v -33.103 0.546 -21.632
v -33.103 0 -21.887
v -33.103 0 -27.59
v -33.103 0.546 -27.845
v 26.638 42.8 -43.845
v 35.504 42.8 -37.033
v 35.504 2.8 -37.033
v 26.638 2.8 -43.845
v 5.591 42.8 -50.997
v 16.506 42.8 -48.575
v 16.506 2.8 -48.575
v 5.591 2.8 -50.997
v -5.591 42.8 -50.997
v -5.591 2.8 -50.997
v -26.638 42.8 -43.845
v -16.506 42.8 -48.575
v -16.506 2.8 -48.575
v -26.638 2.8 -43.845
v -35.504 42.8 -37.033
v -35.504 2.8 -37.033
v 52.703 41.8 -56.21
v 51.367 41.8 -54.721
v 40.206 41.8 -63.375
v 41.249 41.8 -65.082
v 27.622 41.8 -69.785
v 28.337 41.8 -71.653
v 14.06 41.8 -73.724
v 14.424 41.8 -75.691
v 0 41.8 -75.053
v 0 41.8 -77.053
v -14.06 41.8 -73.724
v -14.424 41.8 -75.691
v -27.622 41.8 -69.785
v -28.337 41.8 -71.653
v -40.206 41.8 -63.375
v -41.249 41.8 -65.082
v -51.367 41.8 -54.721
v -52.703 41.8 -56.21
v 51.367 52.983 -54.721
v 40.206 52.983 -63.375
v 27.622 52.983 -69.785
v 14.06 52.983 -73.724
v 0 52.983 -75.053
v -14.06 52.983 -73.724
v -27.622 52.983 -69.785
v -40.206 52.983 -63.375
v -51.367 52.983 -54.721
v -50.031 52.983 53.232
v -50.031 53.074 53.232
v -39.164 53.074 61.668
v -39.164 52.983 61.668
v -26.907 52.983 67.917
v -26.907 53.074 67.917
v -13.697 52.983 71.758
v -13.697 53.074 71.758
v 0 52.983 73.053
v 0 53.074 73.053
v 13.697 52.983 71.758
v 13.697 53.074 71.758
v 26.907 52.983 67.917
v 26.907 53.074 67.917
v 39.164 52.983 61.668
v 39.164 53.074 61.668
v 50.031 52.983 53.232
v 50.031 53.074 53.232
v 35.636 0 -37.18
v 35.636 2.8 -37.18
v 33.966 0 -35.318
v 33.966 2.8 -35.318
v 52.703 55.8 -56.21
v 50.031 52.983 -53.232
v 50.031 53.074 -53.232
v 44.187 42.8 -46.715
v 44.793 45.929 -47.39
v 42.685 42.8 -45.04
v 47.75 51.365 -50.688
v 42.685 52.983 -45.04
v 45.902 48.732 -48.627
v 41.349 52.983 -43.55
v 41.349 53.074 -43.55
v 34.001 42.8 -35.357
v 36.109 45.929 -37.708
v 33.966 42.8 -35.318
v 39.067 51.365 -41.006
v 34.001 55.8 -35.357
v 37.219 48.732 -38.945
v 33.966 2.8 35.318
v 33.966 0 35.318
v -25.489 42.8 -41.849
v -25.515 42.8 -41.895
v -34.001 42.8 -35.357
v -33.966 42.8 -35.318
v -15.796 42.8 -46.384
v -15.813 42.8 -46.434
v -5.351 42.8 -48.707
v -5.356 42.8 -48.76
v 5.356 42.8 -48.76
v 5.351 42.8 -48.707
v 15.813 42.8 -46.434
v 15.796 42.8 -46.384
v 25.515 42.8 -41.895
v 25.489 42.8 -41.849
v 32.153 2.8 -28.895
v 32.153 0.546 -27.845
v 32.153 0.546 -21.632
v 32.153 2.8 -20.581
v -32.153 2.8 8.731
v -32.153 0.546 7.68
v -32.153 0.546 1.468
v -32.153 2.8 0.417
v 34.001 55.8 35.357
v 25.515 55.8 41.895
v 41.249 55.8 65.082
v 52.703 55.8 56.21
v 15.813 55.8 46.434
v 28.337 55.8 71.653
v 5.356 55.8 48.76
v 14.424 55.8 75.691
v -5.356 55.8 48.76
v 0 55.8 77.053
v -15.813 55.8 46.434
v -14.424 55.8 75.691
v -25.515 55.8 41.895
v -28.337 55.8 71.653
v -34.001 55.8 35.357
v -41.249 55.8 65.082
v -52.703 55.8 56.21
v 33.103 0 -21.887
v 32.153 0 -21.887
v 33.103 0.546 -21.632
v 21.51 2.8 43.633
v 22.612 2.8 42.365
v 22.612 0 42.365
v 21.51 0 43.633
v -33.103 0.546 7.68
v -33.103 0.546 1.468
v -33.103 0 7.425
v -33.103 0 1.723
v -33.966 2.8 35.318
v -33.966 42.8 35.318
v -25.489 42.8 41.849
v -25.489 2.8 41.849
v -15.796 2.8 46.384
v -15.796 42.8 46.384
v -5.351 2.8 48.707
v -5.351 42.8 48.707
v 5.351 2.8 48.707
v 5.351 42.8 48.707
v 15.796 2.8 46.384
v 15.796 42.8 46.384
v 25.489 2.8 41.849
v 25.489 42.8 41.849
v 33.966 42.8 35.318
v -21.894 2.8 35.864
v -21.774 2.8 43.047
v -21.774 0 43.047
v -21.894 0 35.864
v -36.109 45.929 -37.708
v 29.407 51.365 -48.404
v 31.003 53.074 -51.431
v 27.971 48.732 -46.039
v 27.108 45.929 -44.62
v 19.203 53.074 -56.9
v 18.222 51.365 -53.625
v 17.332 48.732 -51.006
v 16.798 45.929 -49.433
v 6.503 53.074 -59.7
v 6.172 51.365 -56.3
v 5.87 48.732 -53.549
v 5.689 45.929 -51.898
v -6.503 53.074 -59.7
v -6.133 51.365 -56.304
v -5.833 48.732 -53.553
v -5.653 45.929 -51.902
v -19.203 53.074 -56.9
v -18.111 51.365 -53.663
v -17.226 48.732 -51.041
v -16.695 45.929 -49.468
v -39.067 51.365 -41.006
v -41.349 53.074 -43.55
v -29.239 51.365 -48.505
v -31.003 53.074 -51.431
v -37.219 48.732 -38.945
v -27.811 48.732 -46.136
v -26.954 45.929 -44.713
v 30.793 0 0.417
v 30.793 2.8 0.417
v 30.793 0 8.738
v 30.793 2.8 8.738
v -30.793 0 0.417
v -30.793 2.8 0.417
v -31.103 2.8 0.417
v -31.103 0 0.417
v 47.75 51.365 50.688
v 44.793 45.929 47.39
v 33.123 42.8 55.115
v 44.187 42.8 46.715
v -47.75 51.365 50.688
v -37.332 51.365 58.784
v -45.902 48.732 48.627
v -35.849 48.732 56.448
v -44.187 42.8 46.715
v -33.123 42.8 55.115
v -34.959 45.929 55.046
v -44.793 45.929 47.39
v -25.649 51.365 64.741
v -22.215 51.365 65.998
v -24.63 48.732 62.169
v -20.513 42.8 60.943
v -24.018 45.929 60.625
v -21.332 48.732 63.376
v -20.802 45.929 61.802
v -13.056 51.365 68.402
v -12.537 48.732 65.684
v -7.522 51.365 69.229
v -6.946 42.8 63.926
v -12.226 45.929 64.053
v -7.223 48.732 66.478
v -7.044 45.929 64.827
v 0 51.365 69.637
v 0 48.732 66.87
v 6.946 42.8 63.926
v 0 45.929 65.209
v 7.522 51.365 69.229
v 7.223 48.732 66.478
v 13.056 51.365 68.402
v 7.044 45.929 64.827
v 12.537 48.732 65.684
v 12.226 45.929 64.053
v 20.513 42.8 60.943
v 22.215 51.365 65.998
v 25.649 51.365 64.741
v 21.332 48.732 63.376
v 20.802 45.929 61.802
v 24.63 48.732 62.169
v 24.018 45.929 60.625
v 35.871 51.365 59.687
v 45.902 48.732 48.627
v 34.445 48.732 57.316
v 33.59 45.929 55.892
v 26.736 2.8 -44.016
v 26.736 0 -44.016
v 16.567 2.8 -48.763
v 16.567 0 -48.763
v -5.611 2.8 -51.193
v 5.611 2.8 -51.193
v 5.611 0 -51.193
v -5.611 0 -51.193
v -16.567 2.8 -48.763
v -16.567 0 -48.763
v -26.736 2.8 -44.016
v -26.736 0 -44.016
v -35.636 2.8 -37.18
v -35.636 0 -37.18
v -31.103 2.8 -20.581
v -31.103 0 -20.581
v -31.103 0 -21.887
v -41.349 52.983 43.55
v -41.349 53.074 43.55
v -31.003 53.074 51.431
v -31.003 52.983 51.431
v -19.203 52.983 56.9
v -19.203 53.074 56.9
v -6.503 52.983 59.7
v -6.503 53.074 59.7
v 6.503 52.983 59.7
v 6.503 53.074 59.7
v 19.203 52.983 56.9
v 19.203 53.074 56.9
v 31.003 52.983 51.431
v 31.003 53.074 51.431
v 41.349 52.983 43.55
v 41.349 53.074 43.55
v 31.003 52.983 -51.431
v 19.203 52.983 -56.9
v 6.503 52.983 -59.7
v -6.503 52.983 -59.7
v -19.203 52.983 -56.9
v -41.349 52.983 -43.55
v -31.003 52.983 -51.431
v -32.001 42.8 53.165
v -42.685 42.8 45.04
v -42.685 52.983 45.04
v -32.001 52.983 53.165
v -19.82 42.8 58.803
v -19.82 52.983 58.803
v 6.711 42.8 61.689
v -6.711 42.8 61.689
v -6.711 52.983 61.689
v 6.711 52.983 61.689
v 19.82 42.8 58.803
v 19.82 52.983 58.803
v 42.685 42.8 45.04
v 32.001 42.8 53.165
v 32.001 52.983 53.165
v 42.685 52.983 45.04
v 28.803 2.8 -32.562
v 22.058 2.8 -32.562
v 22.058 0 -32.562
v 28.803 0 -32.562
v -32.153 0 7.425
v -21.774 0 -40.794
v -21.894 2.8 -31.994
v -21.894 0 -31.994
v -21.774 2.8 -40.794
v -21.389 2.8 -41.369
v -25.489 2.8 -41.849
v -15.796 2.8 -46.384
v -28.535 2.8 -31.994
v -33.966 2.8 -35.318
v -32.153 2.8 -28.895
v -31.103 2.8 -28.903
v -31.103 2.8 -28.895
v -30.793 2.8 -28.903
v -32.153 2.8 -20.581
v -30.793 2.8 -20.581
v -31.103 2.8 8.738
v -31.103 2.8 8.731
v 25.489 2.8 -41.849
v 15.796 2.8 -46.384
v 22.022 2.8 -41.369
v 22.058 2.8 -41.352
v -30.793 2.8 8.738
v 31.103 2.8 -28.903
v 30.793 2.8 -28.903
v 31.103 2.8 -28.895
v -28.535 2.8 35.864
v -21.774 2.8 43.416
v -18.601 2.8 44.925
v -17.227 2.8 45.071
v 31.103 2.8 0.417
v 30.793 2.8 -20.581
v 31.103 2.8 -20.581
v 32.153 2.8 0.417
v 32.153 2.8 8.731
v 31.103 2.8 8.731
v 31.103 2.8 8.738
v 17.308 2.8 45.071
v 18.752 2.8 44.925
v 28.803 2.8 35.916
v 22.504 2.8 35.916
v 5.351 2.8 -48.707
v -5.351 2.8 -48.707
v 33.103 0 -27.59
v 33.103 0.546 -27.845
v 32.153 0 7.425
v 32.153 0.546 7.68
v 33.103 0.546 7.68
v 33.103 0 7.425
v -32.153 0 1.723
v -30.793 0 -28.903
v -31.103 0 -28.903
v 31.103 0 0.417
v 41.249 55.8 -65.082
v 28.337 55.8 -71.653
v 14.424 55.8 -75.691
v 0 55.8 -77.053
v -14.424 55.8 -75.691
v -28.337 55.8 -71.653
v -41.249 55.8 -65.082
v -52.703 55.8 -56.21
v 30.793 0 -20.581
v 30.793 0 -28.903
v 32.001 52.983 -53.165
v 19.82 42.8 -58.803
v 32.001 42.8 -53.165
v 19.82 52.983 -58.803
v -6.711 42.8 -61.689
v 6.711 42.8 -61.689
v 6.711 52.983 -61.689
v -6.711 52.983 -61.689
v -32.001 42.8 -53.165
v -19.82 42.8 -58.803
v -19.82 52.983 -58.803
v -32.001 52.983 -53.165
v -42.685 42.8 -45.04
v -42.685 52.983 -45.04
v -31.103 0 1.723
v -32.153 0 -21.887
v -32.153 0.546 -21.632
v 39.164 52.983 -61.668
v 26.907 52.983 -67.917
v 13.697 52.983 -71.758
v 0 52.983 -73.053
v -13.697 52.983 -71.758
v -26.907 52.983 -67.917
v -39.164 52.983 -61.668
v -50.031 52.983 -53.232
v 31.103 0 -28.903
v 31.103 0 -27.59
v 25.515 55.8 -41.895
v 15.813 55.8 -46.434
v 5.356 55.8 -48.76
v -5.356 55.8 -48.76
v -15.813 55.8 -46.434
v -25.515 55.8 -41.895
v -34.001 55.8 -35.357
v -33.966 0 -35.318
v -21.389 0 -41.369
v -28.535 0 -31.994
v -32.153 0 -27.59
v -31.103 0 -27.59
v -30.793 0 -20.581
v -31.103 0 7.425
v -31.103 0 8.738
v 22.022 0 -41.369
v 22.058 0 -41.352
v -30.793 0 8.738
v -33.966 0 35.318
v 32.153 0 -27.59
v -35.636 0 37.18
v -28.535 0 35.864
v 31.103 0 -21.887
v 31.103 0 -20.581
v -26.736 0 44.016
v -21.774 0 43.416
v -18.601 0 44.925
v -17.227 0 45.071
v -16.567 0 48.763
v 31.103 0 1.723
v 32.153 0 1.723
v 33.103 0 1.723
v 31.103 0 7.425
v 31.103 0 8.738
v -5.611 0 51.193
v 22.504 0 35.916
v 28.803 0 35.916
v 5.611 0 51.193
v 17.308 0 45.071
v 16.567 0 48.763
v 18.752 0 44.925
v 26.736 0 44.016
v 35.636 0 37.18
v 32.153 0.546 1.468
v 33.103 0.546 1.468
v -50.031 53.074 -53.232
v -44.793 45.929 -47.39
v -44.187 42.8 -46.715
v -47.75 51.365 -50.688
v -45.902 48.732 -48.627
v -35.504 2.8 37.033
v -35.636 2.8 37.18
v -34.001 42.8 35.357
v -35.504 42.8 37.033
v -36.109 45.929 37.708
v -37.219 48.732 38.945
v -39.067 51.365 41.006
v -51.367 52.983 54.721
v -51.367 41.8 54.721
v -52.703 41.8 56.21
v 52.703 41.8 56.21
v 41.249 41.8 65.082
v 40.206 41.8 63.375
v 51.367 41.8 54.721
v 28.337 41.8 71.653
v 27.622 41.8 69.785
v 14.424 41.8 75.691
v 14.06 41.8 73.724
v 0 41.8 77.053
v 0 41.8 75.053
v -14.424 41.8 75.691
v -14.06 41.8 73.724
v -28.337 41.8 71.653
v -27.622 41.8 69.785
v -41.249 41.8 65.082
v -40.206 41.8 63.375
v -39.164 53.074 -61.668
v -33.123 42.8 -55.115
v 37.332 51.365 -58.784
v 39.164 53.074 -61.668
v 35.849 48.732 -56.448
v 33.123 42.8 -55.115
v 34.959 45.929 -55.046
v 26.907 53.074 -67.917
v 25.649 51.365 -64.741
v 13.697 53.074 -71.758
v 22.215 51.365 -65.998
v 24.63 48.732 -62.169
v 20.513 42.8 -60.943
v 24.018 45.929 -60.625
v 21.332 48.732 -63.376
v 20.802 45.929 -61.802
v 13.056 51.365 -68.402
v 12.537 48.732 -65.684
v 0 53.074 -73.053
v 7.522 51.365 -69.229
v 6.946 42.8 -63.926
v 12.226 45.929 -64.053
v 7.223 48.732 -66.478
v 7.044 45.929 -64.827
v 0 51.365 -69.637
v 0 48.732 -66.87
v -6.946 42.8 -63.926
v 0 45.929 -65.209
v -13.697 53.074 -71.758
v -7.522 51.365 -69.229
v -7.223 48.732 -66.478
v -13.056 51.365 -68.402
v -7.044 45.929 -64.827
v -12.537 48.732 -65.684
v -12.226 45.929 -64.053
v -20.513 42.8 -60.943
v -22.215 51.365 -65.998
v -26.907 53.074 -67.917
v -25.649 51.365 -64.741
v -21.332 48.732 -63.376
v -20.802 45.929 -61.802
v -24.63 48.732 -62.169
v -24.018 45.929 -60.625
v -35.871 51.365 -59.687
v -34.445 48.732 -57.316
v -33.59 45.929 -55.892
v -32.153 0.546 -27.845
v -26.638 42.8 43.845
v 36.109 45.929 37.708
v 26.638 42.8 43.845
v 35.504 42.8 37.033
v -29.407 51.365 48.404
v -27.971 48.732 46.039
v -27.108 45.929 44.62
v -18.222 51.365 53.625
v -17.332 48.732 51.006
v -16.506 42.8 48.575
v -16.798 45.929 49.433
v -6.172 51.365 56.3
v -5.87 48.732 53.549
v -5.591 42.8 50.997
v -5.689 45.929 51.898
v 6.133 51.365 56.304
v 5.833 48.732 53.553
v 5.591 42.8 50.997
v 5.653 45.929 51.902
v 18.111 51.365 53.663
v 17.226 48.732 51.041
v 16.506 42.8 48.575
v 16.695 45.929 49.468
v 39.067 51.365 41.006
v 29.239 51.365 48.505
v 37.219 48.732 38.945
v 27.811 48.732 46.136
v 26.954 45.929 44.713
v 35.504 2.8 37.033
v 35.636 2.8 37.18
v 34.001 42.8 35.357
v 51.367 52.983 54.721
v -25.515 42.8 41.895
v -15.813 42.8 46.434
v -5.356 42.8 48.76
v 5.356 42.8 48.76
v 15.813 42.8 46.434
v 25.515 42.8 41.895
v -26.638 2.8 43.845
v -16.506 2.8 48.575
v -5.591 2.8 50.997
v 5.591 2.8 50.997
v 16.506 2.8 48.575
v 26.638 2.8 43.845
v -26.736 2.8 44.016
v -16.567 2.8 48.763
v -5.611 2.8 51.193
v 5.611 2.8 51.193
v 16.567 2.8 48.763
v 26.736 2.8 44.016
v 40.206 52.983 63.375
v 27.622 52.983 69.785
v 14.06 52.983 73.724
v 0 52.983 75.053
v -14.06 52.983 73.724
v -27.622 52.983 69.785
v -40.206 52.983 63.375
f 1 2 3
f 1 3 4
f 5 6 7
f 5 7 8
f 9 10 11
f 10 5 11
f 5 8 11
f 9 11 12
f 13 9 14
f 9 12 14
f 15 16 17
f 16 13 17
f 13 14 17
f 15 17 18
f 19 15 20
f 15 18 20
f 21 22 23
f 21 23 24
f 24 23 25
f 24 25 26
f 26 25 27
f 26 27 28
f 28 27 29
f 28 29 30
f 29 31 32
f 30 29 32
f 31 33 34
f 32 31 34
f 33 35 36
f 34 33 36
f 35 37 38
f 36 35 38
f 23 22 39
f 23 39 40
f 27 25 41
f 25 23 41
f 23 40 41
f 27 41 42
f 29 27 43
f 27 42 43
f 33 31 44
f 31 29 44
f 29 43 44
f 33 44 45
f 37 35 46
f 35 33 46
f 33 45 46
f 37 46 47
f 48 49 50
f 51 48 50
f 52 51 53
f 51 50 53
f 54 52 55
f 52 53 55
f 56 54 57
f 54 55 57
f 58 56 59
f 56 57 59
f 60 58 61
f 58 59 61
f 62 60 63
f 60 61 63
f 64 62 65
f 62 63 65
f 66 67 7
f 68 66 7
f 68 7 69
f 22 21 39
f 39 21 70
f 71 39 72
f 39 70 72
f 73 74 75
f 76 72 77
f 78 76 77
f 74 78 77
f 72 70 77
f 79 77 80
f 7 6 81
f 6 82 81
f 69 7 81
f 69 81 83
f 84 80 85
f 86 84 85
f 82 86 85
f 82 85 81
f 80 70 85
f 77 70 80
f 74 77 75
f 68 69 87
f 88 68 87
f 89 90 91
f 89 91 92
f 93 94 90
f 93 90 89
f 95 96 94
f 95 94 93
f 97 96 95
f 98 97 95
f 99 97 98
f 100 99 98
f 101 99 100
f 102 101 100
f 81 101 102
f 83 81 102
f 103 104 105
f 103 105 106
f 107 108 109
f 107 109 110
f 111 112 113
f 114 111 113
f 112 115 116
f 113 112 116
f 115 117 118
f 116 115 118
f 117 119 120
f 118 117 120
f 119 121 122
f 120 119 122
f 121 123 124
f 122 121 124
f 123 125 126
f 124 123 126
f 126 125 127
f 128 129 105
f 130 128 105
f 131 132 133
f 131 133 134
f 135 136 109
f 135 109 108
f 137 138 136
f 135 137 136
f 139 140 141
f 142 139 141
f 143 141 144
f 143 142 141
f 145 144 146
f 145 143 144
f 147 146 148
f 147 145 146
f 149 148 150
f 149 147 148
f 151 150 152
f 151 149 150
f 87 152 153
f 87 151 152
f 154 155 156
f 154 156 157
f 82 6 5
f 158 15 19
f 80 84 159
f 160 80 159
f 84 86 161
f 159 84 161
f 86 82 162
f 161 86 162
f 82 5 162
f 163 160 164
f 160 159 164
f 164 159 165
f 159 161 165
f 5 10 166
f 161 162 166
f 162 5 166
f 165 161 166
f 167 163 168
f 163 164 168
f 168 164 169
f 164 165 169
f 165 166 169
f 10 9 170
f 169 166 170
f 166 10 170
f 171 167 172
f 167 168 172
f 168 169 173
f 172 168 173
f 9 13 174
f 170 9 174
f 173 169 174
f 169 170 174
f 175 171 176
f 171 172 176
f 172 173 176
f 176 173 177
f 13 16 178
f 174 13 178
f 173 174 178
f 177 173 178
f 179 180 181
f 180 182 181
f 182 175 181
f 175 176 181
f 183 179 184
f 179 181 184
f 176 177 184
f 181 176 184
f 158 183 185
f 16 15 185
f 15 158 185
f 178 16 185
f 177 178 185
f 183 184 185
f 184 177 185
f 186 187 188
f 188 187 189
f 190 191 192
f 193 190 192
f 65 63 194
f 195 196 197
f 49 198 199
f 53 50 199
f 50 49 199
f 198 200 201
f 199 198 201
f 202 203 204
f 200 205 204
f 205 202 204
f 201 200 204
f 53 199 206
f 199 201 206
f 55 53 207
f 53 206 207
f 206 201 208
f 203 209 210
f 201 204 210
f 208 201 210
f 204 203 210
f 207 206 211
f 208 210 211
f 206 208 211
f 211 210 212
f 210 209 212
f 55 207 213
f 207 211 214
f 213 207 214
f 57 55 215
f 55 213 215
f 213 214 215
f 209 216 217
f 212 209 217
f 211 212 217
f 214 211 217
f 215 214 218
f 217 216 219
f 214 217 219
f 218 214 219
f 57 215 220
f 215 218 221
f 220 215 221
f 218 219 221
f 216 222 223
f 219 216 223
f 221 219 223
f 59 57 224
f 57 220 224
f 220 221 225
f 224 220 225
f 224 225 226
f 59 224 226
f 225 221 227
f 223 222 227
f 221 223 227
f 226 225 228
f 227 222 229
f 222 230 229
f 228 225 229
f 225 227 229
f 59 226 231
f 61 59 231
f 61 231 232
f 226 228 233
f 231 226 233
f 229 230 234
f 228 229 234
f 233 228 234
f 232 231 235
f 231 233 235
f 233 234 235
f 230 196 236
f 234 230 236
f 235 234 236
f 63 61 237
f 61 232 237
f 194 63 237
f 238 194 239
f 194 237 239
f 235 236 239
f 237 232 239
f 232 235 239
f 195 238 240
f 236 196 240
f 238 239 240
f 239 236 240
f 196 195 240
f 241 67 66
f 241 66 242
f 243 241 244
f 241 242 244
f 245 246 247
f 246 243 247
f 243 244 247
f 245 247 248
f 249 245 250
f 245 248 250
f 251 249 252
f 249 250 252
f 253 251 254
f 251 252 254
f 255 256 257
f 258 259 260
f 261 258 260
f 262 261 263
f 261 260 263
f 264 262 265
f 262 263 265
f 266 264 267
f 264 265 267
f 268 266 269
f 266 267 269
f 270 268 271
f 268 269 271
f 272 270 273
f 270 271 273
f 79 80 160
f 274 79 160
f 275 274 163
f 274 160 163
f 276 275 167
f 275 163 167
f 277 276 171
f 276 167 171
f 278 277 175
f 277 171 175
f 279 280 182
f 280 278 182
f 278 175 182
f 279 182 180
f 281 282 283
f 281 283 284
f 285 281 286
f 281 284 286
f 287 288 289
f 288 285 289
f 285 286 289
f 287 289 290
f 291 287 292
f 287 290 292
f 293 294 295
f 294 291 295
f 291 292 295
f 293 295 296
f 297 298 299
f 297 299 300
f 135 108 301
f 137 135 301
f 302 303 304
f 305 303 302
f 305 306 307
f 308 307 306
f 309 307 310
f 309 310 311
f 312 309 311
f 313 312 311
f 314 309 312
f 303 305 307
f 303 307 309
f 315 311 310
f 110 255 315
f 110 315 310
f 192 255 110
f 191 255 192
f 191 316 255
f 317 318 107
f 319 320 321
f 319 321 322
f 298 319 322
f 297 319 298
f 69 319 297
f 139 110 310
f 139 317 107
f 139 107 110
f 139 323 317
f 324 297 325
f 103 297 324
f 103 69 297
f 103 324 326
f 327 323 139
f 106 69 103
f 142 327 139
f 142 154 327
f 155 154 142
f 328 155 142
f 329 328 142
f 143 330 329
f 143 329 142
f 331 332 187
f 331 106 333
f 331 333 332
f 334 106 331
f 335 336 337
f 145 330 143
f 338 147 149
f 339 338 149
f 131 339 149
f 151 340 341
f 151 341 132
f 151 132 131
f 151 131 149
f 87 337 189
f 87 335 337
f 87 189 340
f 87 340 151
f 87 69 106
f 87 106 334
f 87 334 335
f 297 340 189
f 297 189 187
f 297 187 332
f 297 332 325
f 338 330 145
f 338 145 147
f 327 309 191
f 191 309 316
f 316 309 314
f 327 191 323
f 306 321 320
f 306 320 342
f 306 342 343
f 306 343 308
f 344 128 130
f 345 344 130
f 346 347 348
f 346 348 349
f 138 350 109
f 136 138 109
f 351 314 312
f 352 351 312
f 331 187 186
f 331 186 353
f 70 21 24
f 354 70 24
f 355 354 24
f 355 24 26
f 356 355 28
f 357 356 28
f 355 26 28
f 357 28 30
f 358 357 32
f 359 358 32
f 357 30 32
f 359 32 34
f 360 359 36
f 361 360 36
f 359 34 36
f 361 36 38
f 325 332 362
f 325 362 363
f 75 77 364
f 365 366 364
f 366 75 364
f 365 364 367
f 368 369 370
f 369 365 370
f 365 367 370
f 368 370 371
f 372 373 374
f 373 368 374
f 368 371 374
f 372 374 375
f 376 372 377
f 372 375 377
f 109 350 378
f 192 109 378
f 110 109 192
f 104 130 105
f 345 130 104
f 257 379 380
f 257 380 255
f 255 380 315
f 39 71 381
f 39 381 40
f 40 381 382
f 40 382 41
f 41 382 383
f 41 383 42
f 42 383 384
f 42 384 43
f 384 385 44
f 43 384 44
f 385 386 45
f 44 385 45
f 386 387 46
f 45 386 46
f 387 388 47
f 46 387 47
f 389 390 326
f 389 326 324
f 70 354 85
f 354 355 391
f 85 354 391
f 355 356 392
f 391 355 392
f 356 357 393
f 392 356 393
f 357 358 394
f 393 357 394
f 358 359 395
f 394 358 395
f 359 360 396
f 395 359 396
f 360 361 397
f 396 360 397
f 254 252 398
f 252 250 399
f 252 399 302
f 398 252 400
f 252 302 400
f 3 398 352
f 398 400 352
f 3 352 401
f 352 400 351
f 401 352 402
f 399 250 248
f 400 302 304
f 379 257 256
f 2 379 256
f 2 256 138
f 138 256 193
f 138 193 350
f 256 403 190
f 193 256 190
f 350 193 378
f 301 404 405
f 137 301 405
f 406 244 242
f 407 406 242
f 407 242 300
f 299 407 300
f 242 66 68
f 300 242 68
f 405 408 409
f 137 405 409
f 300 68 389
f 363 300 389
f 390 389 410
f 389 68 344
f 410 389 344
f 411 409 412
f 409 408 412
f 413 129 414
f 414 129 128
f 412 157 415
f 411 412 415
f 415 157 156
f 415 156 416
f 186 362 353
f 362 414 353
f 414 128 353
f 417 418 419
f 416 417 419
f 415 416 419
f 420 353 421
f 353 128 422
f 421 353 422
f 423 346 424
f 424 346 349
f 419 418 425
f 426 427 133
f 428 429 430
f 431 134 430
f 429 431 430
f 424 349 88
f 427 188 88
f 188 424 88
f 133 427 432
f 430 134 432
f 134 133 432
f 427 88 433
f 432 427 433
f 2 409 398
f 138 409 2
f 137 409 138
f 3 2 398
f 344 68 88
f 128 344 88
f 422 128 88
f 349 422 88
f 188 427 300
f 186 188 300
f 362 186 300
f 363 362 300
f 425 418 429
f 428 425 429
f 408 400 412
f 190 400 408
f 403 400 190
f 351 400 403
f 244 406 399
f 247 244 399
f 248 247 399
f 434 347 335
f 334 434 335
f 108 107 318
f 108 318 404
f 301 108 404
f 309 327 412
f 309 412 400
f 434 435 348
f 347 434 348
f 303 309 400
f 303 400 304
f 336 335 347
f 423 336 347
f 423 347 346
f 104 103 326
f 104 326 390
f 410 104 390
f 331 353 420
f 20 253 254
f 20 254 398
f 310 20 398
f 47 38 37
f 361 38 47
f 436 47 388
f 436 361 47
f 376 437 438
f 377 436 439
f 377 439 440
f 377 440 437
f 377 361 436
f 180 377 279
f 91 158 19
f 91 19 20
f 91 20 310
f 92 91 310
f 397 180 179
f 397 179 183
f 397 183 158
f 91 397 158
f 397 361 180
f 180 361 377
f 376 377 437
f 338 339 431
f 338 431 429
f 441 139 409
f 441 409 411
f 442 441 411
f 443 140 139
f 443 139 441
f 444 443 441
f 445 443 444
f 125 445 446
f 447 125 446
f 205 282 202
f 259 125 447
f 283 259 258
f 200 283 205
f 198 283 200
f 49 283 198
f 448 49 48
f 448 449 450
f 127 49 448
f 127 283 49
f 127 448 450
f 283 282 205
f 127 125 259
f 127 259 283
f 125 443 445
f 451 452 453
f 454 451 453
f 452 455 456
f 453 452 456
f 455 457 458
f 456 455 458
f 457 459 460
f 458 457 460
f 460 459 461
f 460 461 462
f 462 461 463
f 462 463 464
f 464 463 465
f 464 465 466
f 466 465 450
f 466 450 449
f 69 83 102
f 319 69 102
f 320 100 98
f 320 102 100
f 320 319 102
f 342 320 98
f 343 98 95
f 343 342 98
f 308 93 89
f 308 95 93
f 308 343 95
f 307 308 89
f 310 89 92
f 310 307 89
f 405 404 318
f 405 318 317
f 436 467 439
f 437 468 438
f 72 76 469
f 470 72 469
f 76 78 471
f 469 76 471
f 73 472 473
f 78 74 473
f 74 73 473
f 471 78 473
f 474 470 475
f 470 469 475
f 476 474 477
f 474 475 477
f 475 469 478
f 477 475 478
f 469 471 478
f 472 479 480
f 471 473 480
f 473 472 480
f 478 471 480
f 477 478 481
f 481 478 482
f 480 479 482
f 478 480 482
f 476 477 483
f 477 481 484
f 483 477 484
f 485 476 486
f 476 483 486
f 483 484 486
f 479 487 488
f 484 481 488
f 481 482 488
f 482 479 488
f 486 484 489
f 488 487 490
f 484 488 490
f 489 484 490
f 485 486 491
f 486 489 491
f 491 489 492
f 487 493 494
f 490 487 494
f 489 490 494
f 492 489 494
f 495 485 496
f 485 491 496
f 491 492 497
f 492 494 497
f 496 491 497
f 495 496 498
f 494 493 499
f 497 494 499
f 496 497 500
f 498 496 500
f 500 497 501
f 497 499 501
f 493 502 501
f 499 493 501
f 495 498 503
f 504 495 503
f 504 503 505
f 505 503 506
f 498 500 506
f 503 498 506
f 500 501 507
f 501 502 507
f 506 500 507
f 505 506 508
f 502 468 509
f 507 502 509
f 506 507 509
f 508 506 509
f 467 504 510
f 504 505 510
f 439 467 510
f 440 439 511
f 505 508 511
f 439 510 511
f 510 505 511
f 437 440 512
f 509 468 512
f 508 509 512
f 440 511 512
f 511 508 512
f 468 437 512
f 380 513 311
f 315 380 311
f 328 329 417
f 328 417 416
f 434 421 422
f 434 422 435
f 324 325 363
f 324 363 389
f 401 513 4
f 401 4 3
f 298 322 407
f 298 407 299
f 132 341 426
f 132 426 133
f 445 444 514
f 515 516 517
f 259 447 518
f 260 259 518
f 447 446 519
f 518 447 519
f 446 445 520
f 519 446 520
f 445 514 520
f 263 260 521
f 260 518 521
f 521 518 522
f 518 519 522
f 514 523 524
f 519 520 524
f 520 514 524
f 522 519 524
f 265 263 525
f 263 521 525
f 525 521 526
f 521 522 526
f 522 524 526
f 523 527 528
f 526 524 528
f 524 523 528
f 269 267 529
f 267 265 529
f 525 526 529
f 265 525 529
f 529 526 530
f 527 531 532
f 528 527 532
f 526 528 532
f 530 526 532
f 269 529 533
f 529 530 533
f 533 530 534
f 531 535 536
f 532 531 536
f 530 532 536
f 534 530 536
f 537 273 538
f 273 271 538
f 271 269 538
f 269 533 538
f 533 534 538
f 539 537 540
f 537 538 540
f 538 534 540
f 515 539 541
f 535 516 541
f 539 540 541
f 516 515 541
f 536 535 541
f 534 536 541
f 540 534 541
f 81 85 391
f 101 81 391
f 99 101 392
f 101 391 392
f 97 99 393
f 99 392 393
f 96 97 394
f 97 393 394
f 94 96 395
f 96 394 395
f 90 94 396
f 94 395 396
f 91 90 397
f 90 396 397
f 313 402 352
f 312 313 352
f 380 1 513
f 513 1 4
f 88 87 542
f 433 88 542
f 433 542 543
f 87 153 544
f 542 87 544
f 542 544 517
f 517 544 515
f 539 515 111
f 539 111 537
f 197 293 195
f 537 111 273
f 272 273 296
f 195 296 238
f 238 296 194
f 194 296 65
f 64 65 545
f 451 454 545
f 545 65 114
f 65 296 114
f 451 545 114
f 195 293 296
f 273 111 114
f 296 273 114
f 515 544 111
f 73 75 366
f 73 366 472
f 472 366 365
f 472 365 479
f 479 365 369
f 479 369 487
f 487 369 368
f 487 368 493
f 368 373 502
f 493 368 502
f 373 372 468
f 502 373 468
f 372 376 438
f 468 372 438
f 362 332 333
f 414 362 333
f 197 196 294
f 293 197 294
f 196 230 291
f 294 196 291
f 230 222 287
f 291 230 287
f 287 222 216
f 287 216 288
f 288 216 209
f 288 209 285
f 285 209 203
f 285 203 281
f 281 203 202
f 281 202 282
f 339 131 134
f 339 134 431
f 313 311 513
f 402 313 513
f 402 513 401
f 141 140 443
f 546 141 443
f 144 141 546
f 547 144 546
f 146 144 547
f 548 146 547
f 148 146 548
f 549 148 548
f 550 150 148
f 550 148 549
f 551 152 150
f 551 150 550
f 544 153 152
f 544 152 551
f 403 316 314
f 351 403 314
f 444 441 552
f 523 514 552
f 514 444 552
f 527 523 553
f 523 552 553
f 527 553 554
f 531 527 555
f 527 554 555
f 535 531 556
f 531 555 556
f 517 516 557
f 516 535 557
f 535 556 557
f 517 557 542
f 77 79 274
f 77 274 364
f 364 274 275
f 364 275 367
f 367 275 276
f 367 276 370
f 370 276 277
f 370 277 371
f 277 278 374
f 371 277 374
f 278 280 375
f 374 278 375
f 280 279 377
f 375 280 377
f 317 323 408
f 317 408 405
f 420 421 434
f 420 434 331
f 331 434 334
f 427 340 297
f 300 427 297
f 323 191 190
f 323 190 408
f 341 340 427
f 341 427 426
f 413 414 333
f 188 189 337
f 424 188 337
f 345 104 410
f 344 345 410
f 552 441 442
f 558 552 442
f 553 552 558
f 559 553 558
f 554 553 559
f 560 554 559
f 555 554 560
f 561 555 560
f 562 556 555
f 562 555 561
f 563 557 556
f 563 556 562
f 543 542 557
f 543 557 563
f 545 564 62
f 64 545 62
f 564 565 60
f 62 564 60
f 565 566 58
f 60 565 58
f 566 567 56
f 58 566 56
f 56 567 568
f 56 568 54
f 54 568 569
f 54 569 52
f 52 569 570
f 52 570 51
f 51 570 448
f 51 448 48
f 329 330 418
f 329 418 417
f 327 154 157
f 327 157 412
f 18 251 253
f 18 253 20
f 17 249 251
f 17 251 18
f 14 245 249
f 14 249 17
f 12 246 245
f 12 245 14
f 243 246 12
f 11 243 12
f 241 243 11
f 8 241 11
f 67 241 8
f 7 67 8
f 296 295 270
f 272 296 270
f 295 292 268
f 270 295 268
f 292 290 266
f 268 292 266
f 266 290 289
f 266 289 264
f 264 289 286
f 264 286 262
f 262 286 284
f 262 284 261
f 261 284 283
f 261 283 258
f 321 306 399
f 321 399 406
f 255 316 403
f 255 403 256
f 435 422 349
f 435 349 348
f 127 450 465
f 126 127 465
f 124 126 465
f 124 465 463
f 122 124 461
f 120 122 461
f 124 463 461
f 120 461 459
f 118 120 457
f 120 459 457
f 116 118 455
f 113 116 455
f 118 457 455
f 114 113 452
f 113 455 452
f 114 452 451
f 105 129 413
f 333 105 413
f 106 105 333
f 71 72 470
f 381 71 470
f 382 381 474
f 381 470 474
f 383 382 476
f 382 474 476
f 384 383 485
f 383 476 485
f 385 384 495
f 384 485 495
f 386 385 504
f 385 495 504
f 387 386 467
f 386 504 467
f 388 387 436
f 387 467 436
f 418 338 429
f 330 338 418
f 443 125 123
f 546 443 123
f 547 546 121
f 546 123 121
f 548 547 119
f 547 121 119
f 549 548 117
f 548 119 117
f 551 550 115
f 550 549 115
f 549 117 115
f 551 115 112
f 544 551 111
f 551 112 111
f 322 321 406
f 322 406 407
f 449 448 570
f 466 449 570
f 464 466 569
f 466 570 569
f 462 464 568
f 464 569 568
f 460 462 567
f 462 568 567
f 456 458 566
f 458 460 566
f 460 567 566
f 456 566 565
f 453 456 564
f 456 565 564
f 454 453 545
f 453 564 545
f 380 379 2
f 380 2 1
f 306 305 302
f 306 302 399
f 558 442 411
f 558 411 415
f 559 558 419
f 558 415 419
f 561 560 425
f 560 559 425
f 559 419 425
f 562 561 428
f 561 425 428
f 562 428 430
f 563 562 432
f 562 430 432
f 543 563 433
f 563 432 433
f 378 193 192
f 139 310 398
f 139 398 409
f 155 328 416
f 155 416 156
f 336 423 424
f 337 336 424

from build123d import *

# Parameters (mm, degrees)
SKETCH1_R                = 51.5
BOSS_EXTRUDE1_DEPTH      = 2.8
SKETCH2_R                = 51.302702975
SKETCH2_R_2              = 49
BOSS_EXTRUDE2_DEPTH      = 40
CUT_EXTRUDE1_DEPTH       = 2.8
SNAP_START               = -32.152970268
SNAP_GROOVE2_DEPTH       = 1.05
SNAP_START_2             = -33.102970268
SNAP_GROOVE2_2_DEPTH     = 0.95
CUT_EXTRUDE9_DEPTH       = 123.425444719
MIRROR10_START           = -32.152970268
MIRROR10_COPY_1_DEPTH    = 1.05
MIRROR10_START_2         = -33.102970268
MIRROR10_COPY_2_DEPTH    = 0.95
MIRROR10_COPY_3_DEPTH    = 0.95
SKETCH23_W               = 0.31
SKETCH23_H               = 8.321250797
CUT_EXTRUDE18_DEPTH      = 10
MIRROR12_COPY_1_SKETCH_W = 0.31
MIRROR12_COPY_1_SKETCH_H = 8.321250797
MIRROR12_COPY_1_DEPTH    = 10


# Read off the part's stored shape, not the designer's step: Snap Groove2
with BuildPart() as part:
    # Sketch1 → Boss-Extrude1 (new body)
    with BuildSketch(Plane(origin=(0, 0, 0), x_dir=(1, 0, 0), z_dir=(0, 1, 0))):
        with Locations(Location((0, 0, 0), (0, 0, 270))):
            Circle(SKETCH1_R)
    extrude(amount=BOSS_EXTRUDE1_DEPTH)

    # Sketch2 → Boss-Extrude2 (add)
    with BuildSketch(Plane(origin=(0, 2.8, 0), x_dir=(1, 0, 0), z_dir=(0, 1, 0))):
        with Locations(Location((0, 0, 0), (0, 0, 270))):
            Circle(SKETCH2_R)
        with Locations(Location((0, 0, 0), (0, 0, 270))):
            Circle(SKETCH2_R_2, mode=Mode.SUBTRACT)
    extrude(amount=BOSS_EXTRUDE2_DEPTH)

    # Sketch3 → Cut-Extrude1 (cut)
    with BuildSketch(Plane(origin=(0, 2.8, 0), x_dir=(1, 0, 0), z_dir=(0, 1, 0))):
        Polygon((28.803377941, 30.903803584), (28.803377941, -35.91647658), (22.504161148, -35.91647658), (22.611913195, -42.365053075), (21.509867104, -43.633319461), (18.751547007, -44.925112233), (17.307649543, -45.070983147), (-17.226935769, -45.070983147), (-18.600923478, -44.925112233), (-21.77353452, -43.416317025), (-21.77353452, -43.046957831), (-21.893563057, -35.863677115), (-28.534712584, -35.863677115), (-28.534712584, 31.993942871), (-21.893563057, 31.993942871), (-21.77353452, 40.794290055), (-21.388795882, 41.368785458), (22.021637567, 41.368785458), (22.058242529, 41.352489898), (22.058242529, 32.561962301), (28.803377941, 32.561962301), align=None)
    extrude(amount=-CUT_EXTRUDE1_DEPTH, mode=Mode.SUBTRACT)

    # Sketch5 → Revolve1 (revolve)
    with BuildSketch(Plane(origin=(0, 0, 0), x_dir=(0, 0, -1), z_dir=(1, 0, 0)), mode=Mode.PRIVATE) as revolve1_sk:
        with BuildLine():
            Line((-51.302702975, 42.8), (-49.053064555, 42.8))
            Line((-49.053064555, 42.8), (-49.053064555, 55.8))
            Line((-49.053064555, 55.8), (-60.053064555, 55.8))
            Line((-60.053064555, 55.8), (-60.053064555, 53.073629834))
            ThreePointArc((-60.053064555, 53.073629834), (-54.22806986, 49.171665315), (-51.302702975, 42.8))
        make_face()
        Polygon((-60.053064555, 53.073629834), (-60.053064555, 55.8), (-62.053064555, 55.8), (-62.053064555, 52.983272883), (-60.053064555, 52.983272883), align=None)
        with BuildLine():
            Line((-62.053064555, 52.983272883), (-62.053064555, 55.8))
            Line((-62.053064555, 55.8), (-73.053064555, 55.8))
            Line((-73.053064555, 55.8), (-73.053064555, 53.073629834))
            ThreePointArc((-73.053064555, 53.073629834), (-67.22806986, 49.171665315), (-64.302702975, 42.8))
            Line((-64.302702975, 42.8), (-62.053064555, 42.8))
            Line((-62.053064555, 42.8), (-62.053064555, 52.983272883))
        make_face()
        Polygon((-73.053064555, 53.073629834), (-73.053064555, 55.8), (-77.053064555, 55.8), (-77.053064555, 41.8), (-75.053064555, 41.8), (-75.053064555, 52.983272883), (-73.053064555, 52.983272883), align=None)
    revolve(revolve1_sk.sketch.rotate(Axis((0, 42.8, 0), (0, 1, 0)), 180), axis=Axis((0, 42.8, 0), (0, 1, 0)))

    # Snap Groove2 outline → Snap Groove2 (cut)
    with BuildSketch(Plane.YZ.offset(SNAP_START)):
        Polygon((0, 7.425343804), (0, 1.722535804), (2.8, 0.416874361), (2.8, 8.731005247), align=None)
    snap_groove2 = extrude(amount=SNAP_GROOVE2_DEPTH, mode=Mode.SUBTRACT)

    # Snap Groove2 2 outline → Snap Groove2 2 (cut)
    with BuildSketch(Plane.YZ.offset(SNAP_START_2)):
        Polygon((0, 7.425343804), (0, 1.722535804), (0.54641169, 1.467739849), (0.54641169, 7.68013976), align=None)
    snap_groove2_2 = extrude(amount=SNAP_GROOVE2_2_DEPTH, mode=Mode.SUBTRACT)

    # Sketch13 → Cut-Extrude9 (cut, symmetric)
    with BuildSketch(Plane(origin=(0, 55.8, 0), x_dir=(1, 0, 0), z_dir=(0, 1, 0))):
        Polygon((-92.348219575, -56.21042489), (-92.348219575, 56.21042489), (-52.702589035, 56.21042489), (-33.965663886, 35.317611426), (-33.965663886, -35.317611426), (-52.702589035, -56.21042489), align=None)
    cut_extrude9 = extrude(amount=CUT_EXTRUDE9_DEPTH, both=True, mode=Mode.SUBTRACT)

    # Mirror7: Cut-Extrude9 across plane
    add(cut_extrude9.mirror(Plane(origin=(0, 0, 0), x_dir=(0, 0, 1), z_dir=(1, 0, 0))), mode=Mode.SUBTRACT)

    # Mirror9: Snap Groove2, Snap Groove2 2 across plane
    add(snap_groove2.mirror(Plane(origin=(0, 0, 0), x_dir=(0, 0, 1), z_dir=(1, 0, 0))), mode=Mode.SUBTRACT)
    add(snap_groove2_2.mirror(Plane(origin=(0, 0, 0), x_dir=(0, 0, 1), z_dir=(1, 0, 0))), mode=Mode.SUBTRACT)

    # Mirror10: Snap Groove2, Snap Groove2 2 across plane
    add(snap_groove2.mirror(Plane(origin=(0.02272558, 10.52276449, -10.082239745), x_dir=(1, 0, 0), z_dir=(0, 0, -1))), mode=Mode.SUBTRACT)
    add(snap_groove2_2.mirror(Plane(origin=(0.02272558, 10.52276449, -10.082239745), x_dir=(1, 0, 0), z_dir=(0, 0, -1))), mode=Mode.SUBTRACT)

    # Mirror10 copy 1 sketch → Mirror10 copy 1 (cut)
    with BuildSketch(Plane(origin=(0, 0, -20.164479489), x_dir=(0, 1, 0), z_dir=(-1, 0, 0)).offset(MIRROR10_START)):
        Polygon((0, 7.425343804), (0, 1.722535804), (2.8, 0.416874361), (2.8, 8.731005247), align=None)
    extrude(amount=MIRROR10_COPY_1_DEPTH, mode=Mode.SUBTRACT)

    # Mirror10 copy 2 sketch → Mirror10 copy 2 (cut)
    with BuildSketch(Plane(origin=(0, 0, -20.164479489), x_dir=(0, 1, 0), z_dir=(-1, 0, 0)).offset(MIRROR10_START_2)):
        Polygon((0, 7.425343804), (0, 1.722535804), (0.54641169, 1.467739849), (0.54641169, 7.68013976), align=None)
    extrude(amount=MIRROR10_COPY_2_DEPTH, mode=Mode.SUBTRACT)

    # Mirror10 copy 3 sketch → Mirror10 copy 3 (cut)
    with BuildSketch(Plane(origin=(0, 0, -20.164479489), x_dir=(0, 1, 0), z_dir=(1, 0, 0)).offset(MIRROR10_START_2)):
        Polygon((0, -7.425343804), (0, -1.722535804), (0.54641169, -1.467739849), (0.54641169, -7.68013976), align=None)
    extrude(amount=MIRROR10_COPY_3_DEPTH, mode=Mode.SUBTRACT)

    # Sketch23 → Cut-Extrude18 (cut)
    with BuildSketch(Plane(origin=(0, 2.8, 0), x_dir=(1, 0, 0), z_dir=(0, 1, 0))):
        with Locations((30.947970268, 24.74197925)):
            Rectangle(SKETCH23_W, SKETCH23_H)
    cut_extrude18 = extrude(amount=-CUT_EXTRUDE18_DEPTH, mode=Mode.SUBTRACT)

    # Mirror11: Cut-Extrude18 across plane
    add(cut_extrude18.mirror(Plane(origin=(0, 0, 0), x_dir=(0, 0, 1), z_dir=(1, 0, 0))), mode=Mode.SUBTRACT)

    # Mirror12: Cut-Extrude18 across plane
    add(cut_extrude18.mirror(Plane(origin=(0.02272558, 10.52276449, -10.082239745), x_dir=(1, 0, 0), z_dir=(0, 0, -1))), mode=Mode.SUBTRACT)

    # Mirror12 copy 1 sketch → Mirror12 copy 1 (cut)
    with BuildSketch(Plane(origin=(0, 2.8, -20.164479489), x_dir=(-1, 0, 0), z_dir=(0, 1, 0))):
        with Locations((30.947970268, 24.74197925)):
            Rectangle(MIRROR12_COPY_1_SKETCH_W, MIRROR12_COPY_1_SKETCH_H)
    extrude(amount=-MIRROR12_COPY_1_DEPTH, mode=Mode.SUBTRACT)


solid = part.part
